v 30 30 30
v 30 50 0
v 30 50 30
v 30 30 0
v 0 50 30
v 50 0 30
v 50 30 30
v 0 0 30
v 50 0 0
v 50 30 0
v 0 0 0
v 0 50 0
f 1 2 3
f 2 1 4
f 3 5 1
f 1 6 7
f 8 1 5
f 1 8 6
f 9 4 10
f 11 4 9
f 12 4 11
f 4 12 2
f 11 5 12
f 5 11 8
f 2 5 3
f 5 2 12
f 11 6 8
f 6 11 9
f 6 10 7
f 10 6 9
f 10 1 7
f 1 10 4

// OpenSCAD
/// feet for my pc, LEL

union() {
  cube([30, 50, 30]);
  cube([50, 30, 30]);
}
